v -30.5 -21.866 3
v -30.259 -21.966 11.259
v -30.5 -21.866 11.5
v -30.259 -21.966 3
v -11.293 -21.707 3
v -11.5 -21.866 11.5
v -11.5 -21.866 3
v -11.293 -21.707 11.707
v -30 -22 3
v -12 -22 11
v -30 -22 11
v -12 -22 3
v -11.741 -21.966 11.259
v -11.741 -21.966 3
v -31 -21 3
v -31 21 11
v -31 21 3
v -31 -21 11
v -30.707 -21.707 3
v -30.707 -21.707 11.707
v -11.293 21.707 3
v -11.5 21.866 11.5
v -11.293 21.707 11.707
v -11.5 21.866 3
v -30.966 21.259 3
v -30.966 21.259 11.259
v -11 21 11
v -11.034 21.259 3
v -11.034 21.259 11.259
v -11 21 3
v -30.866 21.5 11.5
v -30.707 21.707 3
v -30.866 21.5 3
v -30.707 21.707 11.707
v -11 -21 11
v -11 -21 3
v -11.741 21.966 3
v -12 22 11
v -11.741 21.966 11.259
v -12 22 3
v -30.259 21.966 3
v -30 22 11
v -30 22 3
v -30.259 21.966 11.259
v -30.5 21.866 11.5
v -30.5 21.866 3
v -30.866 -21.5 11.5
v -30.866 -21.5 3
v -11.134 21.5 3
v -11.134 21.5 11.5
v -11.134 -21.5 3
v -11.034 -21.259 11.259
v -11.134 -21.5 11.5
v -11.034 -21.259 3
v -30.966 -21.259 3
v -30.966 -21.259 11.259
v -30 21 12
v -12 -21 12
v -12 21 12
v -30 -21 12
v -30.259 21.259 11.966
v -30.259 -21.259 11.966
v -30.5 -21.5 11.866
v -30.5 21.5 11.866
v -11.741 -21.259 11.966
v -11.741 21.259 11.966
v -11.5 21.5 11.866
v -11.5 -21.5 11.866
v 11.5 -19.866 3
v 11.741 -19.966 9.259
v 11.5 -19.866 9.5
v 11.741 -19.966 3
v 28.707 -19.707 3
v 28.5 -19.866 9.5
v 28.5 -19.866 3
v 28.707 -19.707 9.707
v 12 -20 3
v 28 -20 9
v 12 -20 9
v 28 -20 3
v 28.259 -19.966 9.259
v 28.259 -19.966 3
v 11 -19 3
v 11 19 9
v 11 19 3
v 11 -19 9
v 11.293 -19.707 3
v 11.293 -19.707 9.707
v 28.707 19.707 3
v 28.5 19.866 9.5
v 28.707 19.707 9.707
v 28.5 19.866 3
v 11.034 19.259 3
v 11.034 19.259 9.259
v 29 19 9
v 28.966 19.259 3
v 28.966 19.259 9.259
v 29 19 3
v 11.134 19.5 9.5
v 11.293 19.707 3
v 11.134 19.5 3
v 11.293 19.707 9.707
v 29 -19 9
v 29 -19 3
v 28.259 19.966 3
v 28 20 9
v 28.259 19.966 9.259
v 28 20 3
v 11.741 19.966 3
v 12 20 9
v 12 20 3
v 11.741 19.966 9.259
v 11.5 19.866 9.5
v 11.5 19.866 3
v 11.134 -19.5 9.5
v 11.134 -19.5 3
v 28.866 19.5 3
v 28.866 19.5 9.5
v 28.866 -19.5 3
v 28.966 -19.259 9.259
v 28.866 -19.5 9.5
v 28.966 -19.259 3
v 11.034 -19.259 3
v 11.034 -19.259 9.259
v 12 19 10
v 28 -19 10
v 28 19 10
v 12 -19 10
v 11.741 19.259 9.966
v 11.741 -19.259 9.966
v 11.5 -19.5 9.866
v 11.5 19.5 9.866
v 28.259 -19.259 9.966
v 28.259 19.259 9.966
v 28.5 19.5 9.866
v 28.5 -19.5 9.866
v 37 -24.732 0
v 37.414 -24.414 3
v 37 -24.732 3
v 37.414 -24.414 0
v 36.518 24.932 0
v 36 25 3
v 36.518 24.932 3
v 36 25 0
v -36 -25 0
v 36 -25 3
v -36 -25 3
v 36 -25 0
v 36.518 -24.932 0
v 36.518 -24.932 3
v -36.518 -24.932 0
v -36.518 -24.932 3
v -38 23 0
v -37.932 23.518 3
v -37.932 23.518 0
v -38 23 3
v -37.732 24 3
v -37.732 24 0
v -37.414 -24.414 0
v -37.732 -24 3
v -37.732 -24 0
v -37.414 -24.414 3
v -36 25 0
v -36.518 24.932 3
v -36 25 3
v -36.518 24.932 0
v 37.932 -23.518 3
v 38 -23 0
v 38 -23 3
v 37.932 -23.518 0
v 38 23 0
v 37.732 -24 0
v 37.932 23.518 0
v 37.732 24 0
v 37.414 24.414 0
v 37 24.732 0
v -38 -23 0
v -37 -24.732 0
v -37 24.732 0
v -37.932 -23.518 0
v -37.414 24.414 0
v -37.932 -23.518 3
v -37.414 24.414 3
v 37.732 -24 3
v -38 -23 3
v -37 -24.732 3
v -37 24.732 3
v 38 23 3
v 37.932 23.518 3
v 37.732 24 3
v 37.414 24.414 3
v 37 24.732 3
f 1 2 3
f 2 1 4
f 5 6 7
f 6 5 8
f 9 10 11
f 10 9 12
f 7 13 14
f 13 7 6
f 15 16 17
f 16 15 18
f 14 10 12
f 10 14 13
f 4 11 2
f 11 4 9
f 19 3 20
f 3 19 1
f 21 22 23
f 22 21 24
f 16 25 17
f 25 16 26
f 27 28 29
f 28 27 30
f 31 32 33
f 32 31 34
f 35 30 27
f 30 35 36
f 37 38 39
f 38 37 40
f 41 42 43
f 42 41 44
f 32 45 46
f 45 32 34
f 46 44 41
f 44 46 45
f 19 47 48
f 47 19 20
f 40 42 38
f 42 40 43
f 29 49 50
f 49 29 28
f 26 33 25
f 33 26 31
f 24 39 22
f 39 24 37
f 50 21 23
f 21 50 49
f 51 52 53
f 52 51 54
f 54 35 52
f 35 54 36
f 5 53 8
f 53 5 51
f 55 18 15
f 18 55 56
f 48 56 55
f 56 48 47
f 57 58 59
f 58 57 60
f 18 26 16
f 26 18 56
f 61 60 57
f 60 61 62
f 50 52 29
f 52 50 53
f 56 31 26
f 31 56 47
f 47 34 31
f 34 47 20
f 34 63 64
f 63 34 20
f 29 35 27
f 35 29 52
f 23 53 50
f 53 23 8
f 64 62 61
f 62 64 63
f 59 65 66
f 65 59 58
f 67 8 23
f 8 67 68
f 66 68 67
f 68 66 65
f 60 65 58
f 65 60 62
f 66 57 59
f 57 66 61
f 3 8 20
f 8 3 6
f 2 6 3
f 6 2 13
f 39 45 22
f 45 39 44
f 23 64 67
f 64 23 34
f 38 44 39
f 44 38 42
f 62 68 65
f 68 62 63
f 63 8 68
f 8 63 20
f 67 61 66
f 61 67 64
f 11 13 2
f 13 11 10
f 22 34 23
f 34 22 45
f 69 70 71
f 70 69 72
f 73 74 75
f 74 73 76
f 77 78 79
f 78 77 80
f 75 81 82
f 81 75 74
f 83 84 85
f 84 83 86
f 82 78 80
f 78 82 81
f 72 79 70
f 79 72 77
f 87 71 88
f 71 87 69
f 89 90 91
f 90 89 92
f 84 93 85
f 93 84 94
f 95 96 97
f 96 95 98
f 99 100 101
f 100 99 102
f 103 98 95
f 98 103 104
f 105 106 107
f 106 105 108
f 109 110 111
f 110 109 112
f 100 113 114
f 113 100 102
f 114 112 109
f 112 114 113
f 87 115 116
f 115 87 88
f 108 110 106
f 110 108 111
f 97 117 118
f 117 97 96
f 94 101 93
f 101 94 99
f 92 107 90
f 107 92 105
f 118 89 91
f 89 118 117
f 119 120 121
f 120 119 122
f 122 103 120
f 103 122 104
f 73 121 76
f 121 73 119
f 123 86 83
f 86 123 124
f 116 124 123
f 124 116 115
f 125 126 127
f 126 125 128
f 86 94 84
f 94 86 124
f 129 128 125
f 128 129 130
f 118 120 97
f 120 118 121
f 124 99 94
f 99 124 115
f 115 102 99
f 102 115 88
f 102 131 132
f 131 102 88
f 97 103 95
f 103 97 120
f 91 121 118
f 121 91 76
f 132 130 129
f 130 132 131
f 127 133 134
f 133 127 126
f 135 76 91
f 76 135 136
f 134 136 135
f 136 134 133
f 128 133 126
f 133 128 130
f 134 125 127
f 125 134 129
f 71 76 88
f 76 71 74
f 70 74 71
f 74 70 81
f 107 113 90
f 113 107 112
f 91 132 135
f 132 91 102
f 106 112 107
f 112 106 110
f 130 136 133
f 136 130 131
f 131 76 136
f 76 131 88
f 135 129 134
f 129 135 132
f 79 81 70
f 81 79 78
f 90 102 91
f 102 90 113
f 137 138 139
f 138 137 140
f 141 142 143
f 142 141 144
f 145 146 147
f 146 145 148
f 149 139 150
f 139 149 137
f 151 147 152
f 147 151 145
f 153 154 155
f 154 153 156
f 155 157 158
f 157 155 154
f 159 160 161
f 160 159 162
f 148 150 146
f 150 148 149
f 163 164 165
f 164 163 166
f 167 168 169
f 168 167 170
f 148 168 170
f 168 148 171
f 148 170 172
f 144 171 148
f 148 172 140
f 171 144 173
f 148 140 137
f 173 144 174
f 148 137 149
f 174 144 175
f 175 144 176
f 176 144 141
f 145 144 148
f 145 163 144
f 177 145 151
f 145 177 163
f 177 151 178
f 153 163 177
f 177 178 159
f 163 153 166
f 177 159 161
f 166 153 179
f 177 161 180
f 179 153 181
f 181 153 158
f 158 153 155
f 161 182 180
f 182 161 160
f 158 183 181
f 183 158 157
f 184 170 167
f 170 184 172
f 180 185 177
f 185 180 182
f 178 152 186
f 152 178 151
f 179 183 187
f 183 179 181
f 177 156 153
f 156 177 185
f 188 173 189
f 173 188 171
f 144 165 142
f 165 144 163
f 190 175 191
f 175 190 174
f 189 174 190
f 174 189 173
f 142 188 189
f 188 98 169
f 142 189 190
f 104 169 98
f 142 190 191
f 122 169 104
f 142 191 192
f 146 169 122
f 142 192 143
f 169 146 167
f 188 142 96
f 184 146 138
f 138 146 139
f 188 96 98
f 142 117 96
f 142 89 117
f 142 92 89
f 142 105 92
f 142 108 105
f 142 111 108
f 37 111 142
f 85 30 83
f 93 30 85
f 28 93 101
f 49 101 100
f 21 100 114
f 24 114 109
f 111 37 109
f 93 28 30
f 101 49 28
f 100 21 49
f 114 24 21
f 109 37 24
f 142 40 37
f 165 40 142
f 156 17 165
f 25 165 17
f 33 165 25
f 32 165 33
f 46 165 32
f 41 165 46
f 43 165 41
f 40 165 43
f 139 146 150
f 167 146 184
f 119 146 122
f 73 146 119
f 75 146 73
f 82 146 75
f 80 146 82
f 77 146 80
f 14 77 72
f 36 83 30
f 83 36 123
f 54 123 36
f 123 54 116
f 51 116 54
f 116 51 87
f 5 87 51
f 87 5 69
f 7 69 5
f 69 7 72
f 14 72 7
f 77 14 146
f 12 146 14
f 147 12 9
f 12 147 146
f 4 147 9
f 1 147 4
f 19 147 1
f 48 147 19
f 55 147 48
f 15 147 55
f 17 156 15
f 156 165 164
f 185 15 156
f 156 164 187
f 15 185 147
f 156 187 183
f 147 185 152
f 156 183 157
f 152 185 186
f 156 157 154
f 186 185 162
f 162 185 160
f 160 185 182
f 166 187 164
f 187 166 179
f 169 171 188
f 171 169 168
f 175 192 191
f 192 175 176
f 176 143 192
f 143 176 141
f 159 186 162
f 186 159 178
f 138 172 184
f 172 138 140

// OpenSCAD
// One loose fixed-profile rest; print TWO identical rests separately.
// Millimeters. These elevations and contact sizes are UNMEASURED EXAMPLES.
// x crosses the seam, y follows it, z=0 is the flat bench/print-bed plane.
part = "rest"; // "rest" or "contact_coupon"

base_width = 76;
base_length = 50;
base_thickness = 3;
minimum_floor_thickness = 2; // Geometric floor guard, not a strength rating.
base_edge_radius = 2;
left_land_width = 20;
right_land_width = 18;
left_land_length = 44;
right_land_length = 40;
left_land_elevation = 12;  // Absolute upper contact plane above the bench.
right_land_elevation = 10;
seam_relief_width = 22;   // Clear distance between the two land envelopes.
contact_edge_radius = 1;
placement_margin = 3;    // Minimum base margin outside each land envelope.
tape_access_width = 16;  // Declared centered access envelope, not hinge gap.
tape_access_clearance = 2; // Lateral clearance on each side of that envelope.
access_height = 5;       // Declared clear height above floor to lower land top.
coupon_length = 12;      // Short y slice through exactly the same rest source.

// Fixed modest tessellation preserves cardinal extrema and broad flat tops.
$fn = 24;

assert(part == "rest" || part == "contact_coupon",
       "Part must be rest or contact_coupon.");
assert(base_width > 0 && base_length > 0 && base_thickness > 0,
       "Base dimensions must be positive.");
assert(minimum_floor_thickness > 0 && base_thickness >= minimum_floor_thickness,
       "Base must retain the positive minimum floor thickness.");
assert(left_land_width > 0 && right_land_width > 0 &&
       left_land_length > 0 && right_land_length > 0,
       "Land dimensions must be positive.");
assert(contact_edge_radius > 0 && base_edge_radius > 0,
       "Edge radii must be positive.");
assert(2 * base_edge_radius < min(base_width, base_length),
       "Base rounding must leave straight base edges.");
assert(2 * contact_edge_radius < min(left_land_width, right_land_width,
                                   left_land_length, right_land_length),
       "Contact rounding must leave broad flat land tops.");
assert(base_thickness > contact_edge_radius,
       "Contact rounding must join each land above the base underside.");
assert(left_land_elevation >= base_thickness + 2 * contact_edge_radius &&
       right_land_elevation >= base_thickness + 2 * contact_edge_radius,
       "Land elevations must retain rounded support above the floor.");
assert(seam_relief_width > 0 && placement_margin > 0,
       "Seam relief and placement margin must be positive.");
assert(placement_margin >= base_edge_radius,
       "Placement margin must cover the rounded base corners.");
assert(seam_relief_width / 2 + left_land_width + placement_margin <= base_width / 2 &&
       seam_relief_width / 2 + right_land_width + placement_margin <= base_width / 2 &&
       max(left_land_length, right_land_length) + 2 * placement_margin <= base_length,
       "Each land must fit inside the base placement margins.");
assert(tape_access_width > 0 && tape_access_clearance > 0 && access_height > 0,
       "Tape access dimensions and clearance must be positive.");
assert(seam_relief_width >= tape_access_width + 2 * tape_access_clearance,
       "Seam relief must clear the centered tape access envelope.");
assert(min(left_land_elevation, right_land_elevation) - base_thickness >= access_height,
       "Land elevations must clear the declared access height above the floor.");
assert(coupon_length > 2 * contact_edge_radius &&
       coupon_length < min(left_land_length, right_land_length) - 2 * contact_edge_radius,
       "Coupon length must retain a short central contact cross-section.");

module rounded_base() {
    linear_extrude(height = base_thickness)
        rounded_rectangle(base_width, base_length, base_edge_radius);
}

module rounded_rectangle(width, height, radius) {
    offset(r = radius)
        square([width - 2 * radius, height - 2 * radius], center = true);
}

// Three rounded 2D extrusions soften all contact edges, including y ends.
// Their planar tops retain the exact elevation instead of a sphere's faceted
// polar approximation. The lower edge overlaps the base by one radius.
module bearing_land(x_min, width, length, elevation) {
    r = contact_edge_radius;
    bottom = base_thickness - r;
    height = elevation - bottom;
    translate([x_min + width / 2, 0, bottom + height / 2])
        intersection() {
            linear_extrude(height = height, center = true)
                rounded_rectangle(width, length, r);
            rotate([90, 0, 0])
                linear_extrude(height = length, center = true)
                    rounded_rectangle(width, height, r);
            rotate([90, 0, 90])
                linear_extrude(height = width, center = true)
                    rounded_rectangle(length, height, r);
        }
}

module rest() {
    union() {
        rounded_base();
        bearing_land(-seam_relief_width / 2 - left_land_width,
                     left_land_width, left_land_length, left_land_elevation);
        bearing_land(seam_relief_width / 2,
                     right_land_width, right_land_length, right_land_elevation);
    }
}

if (part == "rest") {
    rest();
} else {
    // Intersect the same complete solid; the sample's cut ends are flat.
    intersection() {
        rest();
        translate([-base_width / 2, -coupon_length / 2, 0])
            cube([base_width, coupon_length,
                  max(left_land_elevation, right_land_elevation)]);
    }
}
